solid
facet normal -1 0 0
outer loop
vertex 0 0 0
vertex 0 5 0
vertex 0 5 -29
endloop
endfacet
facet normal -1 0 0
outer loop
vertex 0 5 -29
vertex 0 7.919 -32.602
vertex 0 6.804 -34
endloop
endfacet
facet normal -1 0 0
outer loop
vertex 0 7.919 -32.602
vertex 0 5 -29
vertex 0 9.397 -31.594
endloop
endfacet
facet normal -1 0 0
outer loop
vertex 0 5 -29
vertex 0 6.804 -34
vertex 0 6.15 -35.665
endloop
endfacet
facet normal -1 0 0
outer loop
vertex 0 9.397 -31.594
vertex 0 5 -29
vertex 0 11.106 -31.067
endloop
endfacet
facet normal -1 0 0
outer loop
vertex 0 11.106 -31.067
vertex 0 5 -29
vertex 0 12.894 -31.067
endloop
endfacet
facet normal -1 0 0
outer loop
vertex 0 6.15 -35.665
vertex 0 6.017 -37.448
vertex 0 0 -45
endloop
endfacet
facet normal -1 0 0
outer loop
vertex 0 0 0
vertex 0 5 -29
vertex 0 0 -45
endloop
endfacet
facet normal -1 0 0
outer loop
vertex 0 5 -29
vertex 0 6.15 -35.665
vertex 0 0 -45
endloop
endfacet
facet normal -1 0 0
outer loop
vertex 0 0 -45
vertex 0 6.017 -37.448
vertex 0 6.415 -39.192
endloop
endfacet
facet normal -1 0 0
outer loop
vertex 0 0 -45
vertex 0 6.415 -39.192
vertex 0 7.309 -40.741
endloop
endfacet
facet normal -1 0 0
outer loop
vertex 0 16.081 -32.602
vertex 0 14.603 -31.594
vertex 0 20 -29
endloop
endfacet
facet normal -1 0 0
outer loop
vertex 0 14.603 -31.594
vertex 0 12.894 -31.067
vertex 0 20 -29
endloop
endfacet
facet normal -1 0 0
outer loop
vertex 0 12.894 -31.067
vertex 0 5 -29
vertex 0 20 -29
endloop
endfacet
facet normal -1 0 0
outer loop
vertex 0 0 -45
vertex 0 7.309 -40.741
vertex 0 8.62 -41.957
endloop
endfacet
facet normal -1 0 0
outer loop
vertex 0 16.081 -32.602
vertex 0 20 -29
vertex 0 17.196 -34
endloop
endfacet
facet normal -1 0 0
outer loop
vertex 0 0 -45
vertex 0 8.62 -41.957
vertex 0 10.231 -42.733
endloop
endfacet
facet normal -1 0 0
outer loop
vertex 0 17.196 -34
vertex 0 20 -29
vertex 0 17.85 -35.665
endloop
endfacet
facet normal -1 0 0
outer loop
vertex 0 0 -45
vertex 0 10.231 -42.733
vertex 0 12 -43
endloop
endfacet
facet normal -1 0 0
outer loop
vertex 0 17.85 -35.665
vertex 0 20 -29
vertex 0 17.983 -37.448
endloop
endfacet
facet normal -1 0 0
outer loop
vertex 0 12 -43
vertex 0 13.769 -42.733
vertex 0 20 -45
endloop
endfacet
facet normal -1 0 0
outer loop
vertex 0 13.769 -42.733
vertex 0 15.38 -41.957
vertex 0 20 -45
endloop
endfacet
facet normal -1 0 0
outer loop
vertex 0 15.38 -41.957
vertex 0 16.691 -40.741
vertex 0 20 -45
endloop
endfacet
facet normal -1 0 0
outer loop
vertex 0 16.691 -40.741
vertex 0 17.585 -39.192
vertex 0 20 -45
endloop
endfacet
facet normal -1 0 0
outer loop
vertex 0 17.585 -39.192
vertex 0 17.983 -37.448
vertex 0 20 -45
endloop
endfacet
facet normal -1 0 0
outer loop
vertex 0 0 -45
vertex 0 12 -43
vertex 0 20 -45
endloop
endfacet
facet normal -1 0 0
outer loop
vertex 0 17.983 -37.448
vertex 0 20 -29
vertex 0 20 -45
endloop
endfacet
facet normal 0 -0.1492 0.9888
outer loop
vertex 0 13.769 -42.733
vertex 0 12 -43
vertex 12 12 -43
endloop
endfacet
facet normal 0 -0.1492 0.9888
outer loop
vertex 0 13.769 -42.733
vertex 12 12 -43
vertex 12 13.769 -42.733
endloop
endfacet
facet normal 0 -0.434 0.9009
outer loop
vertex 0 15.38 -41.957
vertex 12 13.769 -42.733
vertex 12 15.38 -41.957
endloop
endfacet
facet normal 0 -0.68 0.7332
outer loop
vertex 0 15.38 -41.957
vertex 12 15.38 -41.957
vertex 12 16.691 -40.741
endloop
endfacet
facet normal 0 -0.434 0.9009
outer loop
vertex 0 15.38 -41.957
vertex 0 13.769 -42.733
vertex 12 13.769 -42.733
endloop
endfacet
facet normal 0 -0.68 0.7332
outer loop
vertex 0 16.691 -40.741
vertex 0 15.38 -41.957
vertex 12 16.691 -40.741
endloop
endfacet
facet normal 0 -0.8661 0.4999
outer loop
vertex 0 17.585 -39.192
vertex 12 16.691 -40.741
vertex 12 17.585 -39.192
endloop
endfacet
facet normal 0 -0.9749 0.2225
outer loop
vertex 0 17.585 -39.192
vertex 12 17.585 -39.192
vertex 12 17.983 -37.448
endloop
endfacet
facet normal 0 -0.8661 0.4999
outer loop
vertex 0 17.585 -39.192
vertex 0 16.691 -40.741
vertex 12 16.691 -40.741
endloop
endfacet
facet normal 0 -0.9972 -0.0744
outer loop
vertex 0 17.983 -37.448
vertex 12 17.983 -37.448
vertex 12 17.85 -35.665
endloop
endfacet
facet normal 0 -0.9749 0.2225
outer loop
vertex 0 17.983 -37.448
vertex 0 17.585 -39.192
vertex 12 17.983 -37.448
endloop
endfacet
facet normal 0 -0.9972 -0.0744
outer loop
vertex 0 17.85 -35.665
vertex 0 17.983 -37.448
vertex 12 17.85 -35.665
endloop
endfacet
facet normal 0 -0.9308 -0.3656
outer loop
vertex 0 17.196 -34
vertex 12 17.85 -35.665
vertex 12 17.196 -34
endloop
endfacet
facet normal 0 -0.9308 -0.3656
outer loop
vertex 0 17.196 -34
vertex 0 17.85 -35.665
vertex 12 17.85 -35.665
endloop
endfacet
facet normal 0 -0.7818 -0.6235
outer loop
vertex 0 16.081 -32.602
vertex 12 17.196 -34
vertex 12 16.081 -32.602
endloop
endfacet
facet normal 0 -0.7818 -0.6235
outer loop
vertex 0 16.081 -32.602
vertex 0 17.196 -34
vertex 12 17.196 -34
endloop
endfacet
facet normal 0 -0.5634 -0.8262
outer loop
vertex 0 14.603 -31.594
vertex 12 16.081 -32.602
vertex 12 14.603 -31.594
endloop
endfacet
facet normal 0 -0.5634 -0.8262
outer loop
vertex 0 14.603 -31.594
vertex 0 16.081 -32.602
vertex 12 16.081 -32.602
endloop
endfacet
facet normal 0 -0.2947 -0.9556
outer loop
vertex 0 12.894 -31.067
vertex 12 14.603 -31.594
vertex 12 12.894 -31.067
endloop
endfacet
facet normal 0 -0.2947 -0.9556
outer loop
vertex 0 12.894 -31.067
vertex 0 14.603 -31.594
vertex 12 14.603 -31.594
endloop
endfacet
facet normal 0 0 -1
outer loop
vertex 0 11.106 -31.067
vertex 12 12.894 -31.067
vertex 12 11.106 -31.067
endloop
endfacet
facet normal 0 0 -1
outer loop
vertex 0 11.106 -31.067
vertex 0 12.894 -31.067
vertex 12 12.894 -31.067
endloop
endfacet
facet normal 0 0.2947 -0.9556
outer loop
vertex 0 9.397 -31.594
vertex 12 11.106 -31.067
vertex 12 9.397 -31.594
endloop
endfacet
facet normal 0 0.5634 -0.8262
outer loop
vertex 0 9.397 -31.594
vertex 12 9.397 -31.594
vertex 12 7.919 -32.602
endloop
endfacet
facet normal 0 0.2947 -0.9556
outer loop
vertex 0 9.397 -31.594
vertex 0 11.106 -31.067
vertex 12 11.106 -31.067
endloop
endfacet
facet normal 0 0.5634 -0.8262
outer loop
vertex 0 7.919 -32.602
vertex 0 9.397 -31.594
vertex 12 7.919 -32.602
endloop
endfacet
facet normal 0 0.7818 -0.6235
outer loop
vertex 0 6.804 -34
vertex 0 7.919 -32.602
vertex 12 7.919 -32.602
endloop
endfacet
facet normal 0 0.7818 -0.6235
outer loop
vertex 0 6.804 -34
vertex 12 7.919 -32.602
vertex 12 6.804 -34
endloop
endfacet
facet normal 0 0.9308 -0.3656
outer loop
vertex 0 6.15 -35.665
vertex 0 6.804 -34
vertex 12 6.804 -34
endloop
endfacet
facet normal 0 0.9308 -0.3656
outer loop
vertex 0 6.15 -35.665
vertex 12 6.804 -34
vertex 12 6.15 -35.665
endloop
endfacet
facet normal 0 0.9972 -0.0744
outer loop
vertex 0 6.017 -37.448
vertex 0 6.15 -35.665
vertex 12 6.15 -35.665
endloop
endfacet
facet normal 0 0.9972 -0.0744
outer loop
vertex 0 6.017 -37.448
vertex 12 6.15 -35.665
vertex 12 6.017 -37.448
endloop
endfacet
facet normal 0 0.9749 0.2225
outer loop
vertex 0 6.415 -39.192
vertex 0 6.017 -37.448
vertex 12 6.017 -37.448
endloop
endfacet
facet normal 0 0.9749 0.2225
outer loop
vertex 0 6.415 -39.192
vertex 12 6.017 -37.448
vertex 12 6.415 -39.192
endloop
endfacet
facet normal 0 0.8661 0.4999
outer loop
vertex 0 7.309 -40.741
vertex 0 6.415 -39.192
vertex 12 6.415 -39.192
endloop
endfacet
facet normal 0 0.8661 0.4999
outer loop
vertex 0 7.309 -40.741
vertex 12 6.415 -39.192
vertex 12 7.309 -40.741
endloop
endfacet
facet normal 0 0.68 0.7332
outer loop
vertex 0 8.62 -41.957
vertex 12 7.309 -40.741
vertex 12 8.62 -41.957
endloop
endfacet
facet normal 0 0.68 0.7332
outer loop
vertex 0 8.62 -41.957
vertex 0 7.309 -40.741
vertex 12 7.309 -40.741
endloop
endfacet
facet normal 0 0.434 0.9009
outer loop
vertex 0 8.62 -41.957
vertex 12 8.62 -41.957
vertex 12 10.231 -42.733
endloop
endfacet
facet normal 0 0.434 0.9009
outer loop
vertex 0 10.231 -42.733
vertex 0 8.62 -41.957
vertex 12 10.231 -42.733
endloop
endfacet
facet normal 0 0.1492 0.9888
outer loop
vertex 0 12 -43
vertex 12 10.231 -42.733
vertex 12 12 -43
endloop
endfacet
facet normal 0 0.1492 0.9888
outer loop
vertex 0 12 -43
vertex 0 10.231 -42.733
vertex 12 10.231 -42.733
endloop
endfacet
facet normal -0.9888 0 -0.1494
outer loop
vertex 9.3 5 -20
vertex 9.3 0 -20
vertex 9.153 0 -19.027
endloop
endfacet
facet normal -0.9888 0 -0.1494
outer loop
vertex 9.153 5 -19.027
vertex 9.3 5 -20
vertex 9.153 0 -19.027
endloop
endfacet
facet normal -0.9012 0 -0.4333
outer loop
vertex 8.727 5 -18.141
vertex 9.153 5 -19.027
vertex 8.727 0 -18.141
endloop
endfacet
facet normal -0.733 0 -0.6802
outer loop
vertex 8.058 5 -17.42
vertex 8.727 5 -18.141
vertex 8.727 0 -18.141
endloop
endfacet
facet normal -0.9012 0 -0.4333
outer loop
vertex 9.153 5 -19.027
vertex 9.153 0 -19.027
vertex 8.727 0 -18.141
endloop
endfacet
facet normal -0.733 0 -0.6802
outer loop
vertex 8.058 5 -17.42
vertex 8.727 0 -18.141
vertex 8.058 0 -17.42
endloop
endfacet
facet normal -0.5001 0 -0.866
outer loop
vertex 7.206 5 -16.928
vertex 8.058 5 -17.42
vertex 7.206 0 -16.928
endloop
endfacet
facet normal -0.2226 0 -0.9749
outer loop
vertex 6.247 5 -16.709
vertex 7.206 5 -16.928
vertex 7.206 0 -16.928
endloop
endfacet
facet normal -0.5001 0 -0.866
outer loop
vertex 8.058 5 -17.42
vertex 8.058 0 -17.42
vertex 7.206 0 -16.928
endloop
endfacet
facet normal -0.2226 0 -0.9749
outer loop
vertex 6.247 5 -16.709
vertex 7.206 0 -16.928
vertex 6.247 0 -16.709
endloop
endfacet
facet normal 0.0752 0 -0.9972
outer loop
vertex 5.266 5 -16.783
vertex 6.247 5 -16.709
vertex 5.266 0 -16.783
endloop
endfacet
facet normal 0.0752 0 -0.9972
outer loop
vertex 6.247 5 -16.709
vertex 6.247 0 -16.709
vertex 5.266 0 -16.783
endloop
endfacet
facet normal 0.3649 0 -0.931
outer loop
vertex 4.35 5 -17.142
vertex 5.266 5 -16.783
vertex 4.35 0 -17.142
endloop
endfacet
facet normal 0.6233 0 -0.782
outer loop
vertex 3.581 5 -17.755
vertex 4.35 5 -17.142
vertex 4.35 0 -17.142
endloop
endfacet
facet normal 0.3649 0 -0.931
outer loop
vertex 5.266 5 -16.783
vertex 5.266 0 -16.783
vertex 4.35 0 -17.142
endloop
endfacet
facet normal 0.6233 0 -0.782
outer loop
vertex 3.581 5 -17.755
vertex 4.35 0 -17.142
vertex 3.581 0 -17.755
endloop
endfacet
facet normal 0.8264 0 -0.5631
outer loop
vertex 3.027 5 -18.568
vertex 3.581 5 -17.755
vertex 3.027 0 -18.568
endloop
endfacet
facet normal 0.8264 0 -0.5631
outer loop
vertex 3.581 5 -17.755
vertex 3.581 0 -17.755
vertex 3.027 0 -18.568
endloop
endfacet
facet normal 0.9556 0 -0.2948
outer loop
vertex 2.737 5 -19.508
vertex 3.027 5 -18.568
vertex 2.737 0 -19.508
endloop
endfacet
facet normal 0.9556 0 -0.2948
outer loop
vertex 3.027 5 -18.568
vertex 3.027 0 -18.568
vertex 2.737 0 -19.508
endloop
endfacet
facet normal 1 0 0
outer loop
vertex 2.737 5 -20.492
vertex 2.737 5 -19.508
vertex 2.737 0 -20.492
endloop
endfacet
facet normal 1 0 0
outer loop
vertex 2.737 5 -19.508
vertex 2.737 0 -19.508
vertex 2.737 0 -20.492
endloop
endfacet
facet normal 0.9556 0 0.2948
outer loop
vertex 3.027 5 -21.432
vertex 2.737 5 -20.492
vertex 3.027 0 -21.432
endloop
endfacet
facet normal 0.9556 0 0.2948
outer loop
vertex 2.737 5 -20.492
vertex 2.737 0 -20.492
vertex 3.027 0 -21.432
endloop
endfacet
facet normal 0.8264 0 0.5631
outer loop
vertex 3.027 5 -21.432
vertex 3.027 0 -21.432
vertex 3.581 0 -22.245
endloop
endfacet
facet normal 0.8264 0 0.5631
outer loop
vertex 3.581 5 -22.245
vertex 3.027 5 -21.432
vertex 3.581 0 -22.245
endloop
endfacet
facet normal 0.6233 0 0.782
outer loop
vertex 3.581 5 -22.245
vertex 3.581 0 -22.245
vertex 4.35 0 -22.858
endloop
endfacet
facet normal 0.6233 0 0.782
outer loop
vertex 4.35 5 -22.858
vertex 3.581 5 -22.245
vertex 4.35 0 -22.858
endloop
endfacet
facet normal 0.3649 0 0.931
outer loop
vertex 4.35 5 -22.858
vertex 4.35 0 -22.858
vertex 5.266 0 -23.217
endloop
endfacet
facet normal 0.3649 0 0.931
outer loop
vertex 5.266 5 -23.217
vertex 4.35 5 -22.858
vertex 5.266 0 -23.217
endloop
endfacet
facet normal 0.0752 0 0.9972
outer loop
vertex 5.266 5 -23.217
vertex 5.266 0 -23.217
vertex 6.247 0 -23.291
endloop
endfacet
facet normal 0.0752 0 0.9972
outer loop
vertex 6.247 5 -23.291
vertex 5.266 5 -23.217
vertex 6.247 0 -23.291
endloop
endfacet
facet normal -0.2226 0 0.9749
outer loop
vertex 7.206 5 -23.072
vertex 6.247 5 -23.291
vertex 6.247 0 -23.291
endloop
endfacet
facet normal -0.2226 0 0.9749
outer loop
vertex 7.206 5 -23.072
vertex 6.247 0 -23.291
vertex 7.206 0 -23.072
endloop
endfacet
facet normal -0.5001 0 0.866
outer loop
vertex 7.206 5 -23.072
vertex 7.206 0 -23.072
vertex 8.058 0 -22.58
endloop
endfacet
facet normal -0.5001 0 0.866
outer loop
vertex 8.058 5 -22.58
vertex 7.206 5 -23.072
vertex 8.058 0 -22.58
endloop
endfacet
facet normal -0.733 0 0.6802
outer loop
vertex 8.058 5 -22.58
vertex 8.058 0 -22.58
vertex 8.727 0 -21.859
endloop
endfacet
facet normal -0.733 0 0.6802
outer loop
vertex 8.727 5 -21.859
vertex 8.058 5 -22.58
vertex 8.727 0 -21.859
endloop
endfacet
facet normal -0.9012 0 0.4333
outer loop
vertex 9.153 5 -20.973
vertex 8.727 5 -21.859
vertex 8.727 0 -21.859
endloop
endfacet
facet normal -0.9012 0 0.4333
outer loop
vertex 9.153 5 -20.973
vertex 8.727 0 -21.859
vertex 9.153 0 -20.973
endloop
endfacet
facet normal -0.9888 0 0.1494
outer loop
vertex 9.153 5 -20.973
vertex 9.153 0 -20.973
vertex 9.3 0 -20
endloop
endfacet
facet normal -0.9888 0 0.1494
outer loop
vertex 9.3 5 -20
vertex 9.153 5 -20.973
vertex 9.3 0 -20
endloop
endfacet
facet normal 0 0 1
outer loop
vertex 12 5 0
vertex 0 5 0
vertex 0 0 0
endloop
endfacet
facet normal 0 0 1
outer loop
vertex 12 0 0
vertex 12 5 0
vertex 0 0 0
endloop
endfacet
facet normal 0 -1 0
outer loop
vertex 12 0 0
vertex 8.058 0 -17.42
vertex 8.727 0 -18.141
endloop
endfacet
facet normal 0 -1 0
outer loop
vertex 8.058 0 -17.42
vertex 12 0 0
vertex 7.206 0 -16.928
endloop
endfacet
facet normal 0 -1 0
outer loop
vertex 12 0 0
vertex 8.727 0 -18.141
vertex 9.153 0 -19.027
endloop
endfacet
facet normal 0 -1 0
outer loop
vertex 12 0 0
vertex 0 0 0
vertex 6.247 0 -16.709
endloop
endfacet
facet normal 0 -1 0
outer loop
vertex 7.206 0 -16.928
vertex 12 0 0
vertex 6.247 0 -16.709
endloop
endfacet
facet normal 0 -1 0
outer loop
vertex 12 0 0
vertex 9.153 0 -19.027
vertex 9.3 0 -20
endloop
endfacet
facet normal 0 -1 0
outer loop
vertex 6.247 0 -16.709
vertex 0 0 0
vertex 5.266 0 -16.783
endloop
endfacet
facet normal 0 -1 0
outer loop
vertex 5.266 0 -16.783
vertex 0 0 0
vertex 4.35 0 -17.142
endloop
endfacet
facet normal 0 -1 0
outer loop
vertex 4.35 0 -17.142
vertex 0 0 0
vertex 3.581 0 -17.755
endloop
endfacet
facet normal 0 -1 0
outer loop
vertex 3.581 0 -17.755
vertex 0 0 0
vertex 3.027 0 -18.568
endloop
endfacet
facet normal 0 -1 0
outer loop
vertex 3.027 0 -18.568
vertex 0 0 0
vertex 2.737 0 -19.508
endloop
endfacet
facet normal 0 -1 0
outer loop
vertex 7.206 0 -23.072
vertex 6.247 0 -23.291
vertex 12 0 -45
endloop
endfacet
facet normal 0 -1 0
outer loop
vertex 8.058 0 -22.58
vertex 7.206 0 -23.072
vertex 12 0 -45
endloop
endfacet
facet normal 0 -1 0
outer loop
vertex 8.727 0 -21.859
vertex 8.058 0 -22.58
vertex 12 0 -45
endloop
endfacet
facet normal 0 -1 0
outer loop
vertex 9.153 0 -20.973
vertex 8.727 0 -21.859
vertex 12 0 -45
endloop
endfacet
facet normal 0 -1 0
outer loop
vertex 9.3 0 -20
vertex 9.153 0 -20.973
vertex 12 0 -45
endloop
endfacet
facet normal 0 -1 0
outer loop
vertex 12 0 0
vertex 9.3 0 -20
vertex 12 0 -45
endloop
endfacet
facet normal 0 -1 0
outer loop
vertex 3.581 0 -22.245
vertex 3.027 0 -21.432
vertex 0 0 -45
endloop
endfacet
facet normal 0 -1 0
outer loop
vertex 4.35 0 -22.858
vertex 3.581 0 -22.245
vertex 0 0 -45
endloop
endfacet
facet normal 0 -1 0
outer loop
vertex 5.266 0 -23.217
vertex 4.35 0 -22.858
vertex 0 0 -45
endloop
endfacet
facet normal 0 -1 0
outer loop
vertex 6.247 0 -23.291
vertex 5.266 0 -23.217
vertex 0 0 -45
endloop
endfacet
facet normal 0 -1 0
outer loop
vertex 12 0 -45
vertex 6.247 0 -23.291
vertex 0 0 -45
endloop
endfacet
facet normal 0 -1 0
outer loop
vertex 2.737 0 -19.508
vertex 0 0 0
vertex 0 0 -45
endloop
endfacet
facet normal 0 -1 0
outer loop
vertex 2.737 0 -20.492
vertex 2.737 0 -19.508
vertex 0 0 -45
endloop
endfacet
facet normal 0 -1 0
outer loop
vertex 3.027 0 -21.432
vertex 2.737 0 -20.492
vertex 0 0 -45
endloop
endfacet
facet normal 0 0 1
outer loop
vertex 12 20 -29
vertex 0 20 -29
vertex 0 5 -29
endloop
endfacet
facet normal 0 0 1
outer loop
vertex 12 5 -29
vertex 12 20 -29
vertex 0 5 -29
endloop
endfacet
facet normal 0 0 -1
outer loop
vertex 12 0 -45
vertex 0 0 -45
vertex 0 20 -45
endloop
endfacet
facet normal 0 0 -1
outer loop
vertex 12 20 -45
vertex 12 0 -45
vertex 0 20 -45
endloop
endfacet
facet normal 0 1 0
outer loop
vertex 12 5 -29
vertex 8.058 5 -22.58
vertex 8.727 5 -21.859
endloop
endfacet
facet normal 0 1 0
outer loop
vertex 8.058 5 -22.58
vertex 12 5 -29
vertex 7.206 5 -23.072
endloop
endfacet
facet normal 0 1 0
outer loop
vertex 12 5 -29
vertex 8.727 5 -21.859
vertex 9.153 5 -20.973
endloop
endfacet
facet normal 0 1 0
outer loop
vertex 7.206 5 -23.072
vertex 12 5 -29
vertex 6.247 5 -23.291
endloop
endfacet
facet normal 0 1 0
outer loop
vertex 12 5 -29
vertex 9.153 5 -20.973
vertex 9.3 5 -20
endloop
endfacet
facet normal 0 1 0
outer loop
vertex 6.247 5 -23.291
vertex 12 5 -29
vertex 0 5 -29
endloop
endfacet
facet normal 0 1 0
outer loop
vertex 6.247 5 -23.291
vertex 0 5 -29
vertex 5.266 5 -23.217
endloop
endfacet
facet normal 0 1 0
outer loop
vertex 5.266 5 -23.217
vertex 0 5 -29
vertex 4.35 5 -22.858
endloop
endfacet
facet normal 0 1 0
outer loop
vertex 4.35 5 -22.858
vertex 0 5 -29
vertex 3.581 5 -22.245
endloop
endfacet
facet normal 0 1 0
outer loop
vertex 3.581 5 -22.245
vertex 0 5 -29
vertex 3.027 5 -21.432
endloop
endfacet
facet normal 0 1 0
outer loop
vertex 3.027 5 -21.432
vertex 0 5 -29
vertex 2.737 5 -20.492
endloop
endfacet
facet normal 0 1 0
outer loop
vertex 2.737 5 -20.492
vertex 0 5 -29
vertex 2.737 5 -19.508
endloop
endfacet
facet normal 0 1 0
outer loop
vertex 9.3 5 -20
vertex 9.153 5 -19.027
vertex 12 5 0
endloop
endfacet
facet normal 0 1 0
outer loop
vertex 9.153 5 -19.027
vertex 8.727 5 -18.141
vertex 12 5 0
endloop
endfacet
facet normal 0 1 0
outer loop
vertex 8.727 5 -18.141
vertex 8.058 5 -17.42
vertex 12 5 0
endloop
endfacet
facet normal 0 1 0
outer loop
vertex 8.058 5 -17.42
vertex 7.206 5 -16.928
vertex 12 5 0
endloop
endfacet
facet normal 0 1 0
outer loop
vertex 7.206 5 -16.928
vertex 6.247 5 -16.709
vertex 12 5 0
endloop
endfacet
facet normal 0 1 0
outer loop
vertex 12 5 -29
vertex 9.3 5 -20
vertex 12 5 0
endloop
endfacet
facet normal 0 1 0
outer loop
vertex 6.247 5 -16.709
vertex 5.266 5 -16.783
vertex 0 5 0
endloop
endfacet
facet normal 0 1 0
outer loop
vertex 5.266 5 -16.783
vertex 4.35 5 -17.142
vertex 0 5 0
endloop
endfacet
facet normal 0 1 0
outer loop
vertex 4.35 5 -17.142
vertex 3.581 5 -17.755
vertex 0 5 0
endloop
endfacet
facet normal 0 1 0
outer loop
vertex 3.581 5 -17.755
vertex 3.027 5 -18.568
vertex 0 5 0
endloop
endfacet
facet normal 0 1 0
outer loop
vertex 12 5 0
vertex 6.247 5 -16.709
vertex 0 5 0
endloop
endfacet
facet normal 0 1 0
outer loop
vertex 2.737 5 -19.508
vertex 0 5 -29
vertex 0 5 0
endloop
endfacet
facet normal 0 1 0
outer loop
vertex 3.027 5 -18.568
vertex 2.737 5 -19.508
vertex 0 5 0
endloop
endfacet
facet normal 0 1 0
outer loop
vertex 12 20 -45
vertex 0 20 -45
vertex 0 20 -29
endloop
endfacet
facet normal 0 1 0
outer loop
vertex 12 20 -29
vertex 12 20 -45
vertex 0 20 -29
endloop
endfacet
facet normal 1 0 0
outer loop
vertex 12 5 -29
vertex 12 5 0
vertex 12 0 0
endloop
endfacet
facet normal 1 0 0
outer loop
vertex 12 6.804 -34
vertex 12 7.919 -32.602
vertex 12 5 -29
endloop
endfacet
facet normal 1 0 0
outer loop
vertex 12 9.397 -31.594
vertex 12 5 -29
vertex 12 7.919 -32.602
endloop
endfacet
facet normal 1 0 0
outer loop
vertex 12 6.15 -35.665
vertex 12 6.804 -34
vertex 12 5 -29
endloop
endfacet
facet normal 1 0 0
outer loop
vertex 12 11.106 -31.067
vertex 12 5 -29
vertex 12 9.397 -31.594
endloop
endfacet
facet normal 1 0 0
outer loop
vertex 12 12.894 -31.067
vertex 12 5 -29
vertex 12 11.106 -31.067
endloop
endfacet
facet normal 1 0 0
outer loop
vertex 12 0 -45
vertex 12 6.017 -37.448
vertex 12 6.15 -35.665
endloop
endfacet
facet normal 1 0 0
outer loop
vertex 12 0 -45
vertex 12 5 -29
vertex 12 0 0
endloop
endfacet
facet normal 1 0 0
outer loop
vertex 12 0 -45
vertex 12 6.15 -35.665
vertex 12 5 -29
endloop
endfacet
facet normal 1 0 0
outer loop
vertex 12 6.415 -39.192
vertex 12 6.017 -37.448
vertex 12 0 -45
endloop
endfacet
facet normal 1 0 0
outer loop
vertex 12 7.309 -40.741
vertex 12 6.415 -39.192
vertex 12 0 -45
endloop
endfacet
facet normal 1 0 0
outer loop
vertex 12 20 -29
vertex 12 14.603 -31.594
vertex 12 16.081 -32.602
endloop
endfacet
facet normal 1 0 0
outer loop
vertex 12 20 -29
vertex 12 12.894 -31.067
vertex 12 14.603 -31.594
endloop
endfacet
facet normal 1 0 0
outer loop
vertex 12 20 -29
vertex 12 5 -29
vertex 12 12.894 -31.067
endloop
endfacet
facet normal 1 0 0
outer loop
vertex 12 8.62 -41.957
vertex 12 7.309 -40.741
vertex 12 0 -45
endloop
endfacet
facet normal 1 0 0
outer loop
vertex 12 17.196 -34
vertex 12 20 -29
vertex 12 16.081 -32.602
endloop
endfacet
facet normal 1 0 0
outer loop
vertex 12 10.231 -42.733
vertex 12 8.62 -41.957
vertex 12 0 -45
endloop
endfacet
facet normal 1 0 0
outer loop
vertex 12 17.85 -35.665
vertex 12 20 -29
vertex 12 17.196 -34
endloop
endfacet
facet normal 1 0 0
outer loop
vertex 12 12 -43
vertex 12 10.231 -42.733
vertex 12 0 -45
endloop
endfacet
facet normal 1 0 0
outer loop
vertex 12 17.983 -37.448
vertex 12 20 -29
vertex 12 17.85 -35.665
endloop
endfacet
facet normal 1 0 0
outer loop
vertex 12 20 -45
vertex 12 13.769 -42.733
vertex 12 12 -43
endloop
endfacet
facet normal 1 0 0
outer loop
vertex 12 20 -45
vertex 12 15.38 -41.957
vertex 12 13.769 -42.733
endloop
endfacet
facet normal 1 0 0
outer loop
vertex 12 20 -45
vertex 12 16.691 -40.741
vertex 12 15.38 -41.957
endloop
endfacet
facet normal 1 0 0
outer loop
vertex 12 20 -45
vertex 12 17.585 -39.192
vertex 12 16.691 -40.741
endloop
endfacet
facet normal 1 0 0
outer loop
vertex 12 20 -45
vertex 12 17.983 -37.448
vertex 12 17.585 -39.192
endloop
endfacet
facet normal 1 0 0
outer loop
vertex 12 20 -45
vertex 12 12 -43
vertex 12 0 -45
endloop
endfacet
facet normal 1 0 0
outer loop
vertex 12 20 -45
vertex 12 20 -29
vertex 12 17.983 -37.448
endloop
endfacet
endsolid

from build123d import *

# Parameters (mm, degrees)
SKETCH1_R            = 6
BOSS_EXTRUDE1_DEPTH  = 12
M6_CLEARANCE_HOLE1_D = 6.6


with BuildPart() as part:
    # Sketch1 → Boss-Extrude1 (new body)
    with BuildSketch(Plane(origin=(0, 0, 0), x_dir=(0, 0, -1), z_dir=(1, 0, 0))):
        Polygon((0, 0), (45, 0), (45, 20), (29, 20), (29, 5), (0, 5), align=None)
        with Locations((37, 12)):
            Circle(SKETCH1_R, mode=Mode.SUBTRACT)
    extrude(amount=BOSS_EXTRUDE1_DEPTH)

    # M6 Clearance Hole1 (through all)
    with Locations(Plane(origin=(0, 5, 0), x_dir=(-1, 0, 0), z_dir=(0, 1, 0))):
        with Locations((-6, -20)):
            Hole(M6_CLEARANCE_HOLE1_D / 2)


solid = part.part
